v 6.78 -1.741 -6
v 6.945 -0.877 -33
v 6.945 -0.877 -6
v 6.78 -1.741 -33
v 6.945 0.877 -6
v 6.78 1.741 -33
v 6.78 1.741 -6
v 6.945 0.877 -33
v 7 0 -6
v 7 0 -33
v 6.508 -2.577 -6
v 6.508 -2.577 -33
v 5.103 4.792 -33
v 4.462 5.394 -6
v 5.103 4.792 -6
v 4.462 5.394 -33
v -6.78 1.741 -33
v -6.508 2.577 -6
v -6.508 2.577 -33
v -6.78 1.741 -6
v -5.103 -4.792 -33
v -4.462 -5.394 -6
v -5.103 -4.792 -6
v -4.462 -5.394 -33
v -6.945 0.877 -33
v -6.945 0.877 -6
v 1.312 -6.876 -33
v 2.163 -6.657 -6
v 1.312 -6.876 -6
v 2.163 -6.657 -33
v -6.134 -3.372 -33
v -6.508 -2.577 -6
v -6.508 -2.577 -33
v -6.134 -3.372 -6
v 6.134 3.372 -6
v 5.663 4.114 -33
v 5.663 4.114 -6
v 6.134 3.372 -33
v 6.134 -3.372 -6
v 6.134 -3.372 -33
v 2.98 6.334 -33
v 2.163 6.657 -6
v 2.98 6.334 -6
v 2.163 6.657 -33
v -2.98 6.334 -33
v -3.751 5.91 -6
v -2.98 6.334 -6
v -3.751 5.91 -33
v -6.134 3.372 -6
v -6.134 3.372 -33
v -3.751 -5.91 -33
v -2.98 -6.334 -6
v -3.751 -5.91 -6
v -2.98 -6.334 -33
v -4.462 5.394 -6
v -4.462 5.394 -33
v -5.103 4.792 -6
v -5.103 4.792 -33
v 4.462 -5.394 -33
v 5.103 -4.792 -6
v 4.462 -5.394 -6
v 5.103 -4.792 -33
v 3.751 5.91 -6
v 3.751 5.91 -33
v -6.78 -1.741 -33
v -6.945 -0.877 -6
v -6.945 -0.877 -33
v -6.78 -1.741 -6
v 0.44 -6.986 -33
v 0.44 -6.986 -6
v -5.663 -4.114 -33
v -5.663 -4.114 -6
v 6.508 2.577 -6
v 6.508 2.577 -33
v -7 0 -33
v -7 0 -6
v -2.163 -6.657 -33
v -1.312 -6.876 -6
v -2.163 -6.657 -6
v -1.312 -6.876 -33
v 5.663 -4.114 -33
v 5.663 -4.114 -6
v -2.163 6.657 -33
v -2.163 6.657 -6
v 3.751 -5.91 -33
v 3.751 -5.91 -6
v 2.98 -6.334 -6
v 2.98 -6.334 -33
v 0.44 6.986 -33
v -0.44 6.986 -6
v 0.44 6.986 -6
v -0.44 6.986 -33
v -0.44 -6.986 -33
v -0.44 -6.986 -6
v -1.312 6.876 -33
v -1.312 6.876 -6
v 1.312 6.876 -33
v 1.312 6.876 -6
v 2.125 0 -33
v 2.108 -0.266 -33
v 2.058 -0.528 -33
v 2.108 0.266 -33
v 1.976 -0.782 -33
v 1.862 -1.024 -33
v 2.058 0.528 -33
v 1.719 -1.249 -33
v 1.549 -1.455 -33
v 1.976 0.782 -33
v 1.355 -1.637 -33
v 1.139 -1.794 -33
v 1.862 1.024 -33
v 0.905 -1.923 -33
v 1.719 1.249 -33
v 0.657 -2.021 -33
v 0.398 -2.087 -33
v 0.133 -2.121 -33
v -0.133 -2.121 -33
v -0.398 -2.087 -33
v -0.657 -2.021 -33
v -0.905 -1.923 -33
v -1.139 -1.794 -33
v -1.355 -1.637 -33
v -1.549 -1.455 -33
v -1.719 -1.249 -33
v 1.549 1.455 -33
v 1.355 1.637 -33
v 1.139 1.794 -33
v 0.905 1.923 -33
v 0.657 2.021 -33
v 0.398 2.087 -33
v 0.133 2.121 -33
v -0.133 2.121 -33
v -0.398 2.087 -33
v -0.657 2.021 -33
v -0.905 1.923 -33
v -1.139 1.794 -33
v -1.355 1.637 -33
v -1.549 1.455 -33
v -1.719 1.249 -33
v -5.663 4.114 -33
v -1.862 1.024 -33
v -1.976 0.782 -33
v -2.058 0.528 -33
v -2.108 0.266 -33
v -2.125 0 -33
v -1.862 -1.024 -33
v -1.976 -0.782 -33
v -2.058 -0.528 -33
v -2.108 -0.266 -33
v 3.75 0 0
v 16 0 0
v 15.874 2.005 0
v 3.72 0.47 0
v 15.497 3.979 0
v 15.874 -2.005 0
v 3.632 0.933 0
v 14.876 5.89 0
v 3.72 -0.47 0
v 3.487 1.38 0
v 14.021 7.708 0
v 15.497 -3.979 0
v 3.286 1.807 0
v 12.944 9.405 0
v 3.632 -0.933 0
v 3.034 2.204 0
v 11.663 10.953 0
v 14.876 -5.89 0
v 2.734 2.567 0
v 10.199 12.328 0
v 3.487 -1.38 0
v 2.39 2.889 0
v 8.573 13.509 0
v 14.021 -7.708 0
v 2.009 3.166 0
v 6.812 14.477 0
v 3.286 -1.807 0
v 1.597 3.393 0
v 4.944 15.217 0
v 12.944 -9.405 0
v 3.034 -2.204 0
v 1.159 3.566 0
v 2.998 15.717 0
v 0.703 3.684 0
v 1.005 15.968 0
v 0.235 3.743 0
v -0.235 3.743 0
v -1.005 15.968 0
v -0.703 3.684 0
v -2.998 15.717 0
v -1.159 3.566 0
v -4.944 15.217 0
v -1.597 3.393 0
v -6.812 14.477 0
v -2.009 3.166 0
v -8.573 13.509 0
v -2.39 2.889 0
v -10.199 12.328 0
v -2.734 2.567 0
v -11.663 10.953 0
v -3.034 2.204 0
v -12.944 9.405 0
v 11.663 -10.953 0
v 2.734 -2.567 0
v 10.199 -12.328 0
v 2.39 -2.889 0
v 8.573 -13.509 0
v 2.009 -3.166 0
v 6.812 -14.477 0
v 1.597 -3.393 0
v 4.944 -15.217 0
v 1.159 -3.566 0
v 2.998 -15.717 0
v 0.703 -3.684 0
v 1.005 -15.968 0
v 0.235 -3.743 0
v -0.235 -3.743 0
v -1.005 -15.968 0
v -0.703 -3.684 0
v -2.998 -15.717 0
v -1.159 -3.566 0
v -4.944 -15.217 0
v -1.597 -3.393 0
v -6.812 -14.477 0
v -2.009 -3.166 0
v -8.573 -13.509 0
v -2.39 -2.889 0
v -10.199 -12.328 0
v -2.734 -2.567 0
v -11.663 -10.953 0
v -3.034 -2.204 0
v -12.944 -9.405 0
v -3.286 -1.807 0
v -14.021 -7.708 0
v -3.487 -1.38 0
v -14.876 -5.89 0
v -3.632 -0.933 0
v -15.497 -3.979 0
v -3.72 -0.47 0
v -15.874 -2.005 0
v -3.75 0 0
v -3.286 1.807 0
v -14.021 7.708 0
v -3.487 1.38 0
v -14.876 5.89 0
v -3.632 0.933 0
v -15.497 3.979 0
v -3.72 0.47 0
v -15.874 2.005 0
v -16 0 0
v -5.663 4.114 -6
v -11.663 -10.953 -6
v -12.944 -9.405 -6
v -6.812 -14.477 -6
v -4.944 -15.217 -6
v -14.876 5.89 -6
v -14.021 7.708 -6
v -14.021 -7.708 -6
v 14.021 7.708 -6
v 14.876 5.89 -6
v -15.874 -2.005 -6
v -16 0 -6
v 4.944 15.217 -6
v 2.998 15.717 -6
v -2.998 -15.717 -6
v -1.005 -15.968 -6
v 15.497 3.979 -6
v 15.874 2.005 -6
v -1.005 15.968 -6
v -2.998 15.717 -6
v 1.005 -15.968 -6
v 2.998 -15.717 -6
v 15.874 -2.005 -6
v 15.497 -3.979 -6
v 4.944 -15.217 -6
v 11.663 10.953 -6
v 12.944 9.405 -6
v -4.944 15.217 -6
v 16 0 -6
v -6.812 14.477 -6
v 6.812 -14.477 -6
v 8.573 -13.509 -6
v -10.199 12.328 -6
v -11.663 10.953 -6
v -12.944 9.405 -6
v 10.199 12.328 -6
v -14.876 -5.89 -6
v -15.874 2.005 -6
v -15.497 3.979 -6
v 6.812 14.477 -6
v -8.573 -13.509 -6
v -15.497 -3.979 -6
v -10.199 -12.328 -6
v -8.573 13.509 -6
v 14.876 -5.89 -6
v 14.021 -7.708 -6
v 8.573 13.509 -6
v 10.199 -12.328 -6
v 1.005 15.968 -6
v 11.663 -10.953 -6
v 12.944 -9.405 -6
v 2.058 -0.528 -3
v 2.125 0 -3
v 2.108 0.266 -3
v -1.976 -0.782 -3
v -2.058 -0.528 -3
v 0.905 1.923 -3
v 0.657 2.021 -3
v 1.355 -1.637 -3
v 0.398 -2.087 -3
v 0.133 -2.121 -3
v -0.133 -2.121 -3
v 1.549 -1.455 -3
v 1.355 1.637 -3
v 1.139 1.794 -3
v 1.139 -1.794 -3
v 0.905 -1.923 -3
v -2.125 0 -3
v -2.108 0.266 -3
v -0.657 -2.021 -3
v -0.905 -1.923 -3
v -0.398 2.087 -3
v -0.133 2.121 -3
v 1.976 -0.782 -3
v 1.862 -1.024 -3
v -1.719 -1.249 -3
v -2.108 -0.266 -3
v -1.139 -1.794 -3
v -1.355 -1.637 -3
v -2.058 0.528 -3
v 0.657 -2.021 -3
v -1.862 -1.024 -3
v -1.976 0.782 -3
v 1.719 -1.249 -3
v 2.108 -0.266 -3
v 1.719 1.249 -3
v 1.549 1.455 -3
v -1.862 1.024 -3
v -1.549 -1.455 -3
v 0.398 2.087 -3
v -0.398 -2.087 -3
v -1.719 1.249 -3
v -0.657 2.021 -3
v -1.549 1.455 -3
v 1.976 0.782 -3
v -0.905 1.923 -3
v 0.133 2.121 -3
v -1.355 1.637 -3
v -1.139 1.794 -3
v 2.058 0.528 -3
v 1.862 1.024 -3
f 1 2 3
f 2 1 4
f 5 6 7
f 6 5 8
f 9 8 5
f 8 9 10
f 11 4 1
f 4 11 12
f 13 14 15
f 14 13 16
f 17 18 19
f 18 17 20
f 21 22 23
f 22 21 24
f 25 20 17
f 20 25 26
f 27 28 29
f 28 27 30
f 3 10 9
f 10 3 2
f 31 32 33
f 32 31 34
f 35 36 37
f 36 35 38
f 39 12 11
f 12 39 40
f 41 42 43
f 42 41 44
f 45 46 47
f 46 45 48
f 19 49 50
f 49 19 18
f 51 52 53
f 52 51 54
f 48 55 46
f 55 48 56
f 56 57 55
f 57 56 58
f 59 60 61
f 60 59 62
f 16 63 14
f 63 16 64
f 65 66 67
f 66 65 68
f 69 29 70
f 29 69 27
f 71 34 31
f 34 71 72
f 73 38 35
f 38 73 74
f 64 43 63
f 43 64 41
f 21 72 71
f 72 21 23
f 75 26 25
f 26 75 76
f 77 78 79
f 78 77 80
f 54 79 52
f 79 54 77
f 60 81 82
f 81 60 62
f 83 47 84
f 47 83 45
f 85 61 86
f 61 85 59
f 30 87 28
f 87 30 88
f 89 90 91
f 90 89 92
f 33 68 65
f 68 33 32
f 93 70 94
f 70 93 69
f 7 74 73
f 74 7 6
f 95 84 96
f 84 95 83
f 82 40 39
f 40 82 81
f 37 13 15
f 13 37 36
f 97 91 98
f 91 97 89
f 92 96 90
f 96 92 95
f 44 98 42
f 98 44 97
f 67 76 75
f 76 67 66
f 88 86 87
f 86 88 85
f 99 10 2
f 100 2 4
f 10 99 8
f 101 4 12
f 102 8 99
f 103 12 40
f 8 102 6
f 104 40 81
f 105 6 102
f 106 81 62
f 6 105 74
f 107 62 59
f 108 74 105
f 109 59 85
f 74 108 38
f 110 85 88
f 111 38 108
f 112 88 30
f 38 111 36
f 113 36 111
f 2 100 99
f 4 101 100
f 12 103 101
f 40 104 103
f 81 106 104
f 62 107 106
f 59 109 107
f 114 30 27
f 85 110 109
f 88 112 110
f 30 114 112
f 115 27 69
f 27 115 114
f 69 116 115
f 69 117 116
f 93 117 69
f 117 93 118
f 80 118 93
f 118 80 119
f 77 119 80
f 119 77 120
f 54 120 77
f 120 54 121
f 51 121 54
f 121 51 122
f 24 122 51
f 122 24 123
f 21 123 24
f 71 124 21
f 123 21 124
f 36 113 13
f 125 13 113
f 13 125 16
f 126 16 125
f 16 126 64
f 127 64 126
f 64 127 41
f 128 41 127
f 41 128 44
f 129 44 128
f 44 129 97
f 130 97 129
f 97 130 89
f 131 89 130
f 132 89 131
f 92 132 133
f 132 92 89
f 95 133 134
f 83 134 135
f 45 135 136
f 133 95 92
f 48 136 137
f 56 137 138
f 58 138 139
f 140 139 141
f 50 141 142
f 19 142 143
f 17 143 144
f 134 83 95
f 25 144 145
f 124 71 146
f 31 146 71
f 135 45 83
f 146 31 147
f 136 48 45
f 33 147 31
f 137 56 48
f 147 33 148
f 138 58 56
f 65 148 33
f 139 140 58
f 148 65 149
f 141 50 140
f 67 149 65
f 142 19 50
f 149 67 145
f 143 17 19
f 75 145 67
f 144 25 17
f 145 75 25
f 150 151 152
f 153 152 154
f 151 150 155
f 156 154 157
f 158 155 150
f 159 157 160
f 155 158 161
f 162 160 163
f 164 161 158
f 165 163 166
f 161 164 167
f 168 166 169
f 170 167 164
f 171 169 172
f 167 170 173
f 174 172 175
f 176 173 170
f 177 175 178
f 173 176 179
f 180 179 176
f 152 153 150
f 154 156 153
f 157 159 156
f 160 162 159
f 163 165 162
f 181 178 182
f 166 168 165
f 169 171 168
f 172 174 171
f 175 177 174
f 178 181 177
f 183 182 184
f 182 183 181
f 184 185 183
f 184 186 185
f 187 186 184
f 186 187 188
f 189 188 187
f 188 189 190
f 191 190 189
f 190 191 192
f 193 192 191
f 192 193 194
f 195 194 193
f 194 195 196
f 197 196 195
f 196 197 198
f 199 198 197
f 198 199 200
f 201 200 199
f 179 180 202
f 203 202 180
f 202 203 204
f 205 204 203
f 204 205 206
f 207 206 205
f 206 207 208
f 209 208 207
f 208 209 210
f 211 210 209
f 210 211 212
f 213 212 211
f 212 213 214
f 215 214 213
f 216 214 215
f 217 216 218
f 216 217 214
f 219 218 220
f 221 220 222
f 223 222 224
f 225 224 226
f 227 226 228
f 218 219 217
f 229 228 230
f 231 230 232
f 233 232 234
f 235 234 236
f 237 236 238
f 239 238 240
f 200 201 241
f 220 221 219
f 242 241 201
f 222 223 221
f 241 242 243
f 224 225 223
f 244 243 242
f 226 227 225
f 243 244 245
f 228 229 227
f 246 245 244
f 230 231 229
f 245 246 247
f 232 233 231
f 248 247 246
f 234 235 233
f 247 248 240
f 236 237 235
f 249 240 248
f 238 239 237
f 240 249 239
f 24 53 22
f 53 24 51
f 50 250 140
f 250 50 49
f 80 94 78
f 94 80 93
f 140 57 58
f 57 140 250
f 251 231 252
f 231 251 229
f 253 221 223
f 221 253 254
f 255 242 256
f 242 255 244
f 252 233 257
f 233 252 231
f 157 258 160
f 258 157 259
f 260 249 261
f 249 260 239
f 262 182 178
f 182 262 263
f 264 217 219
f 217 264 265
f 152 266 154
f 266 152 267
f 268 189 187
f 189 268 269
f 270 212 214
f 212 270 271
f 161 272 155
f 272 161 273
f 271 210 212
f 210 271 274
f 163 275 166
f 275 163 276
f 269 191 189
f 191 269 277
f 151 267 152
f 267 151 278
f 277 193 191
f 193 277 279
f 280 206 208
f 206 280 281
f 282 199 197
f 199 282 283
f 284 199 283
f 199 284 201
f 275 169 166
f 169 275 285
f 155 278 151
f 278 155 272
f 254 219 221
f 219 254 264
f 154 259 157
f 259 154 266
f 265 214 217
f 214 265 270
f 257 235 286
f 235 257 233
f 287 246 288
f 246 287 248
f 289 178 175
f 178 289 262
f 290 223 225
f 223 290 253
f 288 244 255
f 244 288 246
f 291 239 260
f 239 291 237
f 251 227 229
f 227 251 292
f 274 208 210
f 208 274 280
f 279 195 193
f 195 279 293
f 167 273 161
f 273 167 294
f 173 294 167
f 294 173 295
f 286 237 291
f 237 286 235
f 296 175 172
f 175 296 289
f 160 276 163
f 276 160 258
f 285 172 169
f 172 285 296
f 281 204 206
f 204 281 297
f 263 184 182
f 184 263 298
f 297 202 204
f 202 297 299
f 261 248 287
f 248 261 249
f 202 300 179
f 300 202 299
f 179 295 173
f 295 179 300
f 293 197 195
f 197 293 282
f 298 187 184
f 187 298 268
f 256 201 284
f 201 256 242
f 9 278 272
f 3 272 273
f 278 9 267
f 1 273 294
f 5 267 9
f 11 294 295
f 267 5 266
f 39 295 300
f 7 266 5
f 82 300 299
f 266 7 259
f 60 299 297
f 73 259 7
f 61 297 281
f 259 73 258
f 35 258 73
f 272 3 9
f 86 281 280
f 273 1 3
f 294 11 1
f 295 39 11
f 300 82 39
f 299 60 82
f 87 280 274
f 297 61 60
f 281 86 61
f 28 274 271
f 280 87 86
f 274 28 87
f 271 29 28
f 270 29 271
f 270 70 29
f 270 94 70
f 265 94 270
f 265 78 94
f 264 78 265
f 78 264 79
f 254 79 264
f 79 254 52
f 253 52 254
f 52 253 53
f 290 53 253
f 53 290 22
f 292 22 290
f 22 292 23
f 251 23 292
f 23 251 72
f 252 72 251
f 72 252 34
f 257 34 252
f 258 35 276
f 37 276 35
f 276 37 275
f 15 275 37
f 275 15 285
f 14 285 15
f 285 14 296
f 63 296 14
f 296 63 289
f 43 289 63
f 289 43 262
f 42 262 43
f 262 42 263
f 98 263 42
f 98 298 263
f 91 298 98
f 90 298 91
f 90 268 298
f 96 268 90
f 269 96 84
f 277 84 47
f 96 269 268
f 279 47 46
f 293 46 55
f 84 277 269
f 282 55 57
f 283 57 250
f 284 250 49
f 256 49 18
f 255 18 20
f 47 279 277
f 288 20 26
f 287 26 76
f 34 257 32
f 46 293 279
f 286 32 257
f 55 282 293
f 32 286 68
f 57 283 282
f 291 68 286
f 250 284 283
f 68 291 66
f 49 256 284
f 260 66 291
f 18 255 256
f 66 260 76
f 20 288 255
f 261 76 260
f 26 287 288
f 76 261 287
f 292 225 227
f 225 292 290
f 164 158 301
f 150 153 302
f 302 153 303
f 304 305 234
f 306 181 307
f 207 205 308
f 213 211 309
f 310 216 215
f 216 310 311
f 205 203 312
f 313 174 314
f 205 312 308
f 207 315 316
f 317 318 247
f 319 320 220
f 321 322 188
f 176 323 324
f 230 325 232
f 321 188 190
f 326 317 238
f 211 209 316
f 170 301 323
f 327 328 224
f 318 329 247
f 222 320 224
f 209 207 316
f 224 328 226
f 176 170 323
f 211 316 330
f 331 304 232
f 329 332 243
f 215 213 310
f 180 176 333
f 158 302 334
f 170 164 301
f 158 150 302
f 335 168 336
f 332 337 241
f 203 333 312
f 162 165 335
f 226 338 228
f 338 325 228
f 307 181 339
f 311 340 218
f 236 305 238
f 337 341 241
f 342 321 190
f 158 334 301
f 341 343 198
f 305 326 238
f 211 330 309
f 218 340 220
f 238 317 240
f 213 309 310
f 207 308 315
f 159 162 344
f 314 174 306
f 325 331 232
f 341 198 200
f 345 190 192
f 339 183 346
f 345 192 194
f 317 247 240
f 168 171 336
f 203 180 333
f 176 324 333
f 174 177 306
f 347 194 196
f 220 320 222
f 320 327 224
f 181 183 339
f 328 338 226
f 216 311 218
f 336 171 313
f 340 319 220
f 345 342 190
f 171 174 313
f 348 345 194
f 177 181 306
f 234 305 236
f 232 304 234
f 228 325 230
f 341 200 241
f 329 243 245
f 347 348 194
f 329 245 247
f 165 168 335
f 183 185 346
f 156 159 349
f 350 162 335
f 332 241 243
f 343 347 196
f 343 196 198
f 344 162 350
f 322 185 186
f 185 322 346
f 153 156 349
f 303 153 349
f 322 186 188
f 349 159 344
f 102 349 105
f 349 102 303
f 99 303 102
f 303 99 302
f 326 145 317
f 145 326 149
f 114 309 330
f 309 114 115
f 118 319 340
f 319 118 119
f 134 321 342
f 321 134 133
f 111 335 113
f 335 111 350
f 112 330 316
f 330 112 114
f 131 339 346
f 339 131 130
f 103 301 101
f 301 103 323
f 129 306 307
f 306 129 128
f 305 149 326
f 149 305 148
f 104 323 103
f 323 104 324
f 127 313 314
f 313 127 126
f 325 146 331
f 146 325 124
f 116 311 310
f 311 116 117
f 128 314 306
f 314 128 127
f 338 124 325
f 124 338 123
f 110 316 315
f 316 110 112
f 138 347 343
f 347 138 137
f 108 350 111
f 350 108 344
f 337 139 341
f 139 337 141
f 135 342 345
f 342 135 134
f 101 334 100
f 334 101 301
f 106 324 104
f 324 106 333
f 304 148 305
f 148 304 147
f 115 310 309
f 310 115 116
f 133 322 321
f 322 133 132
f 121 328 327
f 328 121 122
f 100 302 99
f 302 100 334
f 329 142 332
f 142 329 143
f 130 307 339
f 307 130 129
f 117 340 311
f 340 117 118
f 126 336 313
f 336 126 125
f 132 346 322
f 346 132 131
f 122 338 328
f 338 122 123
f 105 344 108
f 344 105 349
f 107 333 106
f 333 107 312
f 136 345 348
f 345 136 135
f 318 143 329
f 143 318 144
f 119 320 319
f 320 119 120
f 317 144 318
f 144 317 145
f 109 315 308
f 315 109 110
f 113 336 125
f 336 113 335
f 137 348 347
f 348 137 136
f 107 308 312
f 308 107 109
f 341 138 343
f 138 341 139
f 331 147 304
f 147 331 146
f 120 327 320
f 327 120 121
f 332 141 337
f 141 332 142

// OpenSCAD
$fn = 50;


difference() {
	union() {
		translate(v = [0, 0, -33.0000000000]) {
			cylinder(h = 33, r = 7.0000000000);
		}
		translate(v = [0, 0, -6.0000000000]) {
			cylinder(h = 6, r = 16.0000000000);
		}
	}
	union() {
		translate(v = [0, 0, 0]) {
			rotate(a = [0, 0, 0]) {
				difference() {
					union() {
						#translate(v = [0, 0, -33.0000000000]) {
							cylinder(h = 33, r = 2.0000000000);
						}
						#translate(v = [0, 0, -3]) {
							cylinder(h = 3, r1 = 2.1250000000, r2 = 3.7500000000);
						}
						#translate(v = [0, 0, -33.0000000000]) {
							cylinder(h = 33, r = 2.1250000000);
						}
						#translate(v = [0, 0, -33.0000000000]) {
							cylinder(h = 33, r = 2.0000000000);
						}
					}
					union();
				}
			}
		}
	}
}
